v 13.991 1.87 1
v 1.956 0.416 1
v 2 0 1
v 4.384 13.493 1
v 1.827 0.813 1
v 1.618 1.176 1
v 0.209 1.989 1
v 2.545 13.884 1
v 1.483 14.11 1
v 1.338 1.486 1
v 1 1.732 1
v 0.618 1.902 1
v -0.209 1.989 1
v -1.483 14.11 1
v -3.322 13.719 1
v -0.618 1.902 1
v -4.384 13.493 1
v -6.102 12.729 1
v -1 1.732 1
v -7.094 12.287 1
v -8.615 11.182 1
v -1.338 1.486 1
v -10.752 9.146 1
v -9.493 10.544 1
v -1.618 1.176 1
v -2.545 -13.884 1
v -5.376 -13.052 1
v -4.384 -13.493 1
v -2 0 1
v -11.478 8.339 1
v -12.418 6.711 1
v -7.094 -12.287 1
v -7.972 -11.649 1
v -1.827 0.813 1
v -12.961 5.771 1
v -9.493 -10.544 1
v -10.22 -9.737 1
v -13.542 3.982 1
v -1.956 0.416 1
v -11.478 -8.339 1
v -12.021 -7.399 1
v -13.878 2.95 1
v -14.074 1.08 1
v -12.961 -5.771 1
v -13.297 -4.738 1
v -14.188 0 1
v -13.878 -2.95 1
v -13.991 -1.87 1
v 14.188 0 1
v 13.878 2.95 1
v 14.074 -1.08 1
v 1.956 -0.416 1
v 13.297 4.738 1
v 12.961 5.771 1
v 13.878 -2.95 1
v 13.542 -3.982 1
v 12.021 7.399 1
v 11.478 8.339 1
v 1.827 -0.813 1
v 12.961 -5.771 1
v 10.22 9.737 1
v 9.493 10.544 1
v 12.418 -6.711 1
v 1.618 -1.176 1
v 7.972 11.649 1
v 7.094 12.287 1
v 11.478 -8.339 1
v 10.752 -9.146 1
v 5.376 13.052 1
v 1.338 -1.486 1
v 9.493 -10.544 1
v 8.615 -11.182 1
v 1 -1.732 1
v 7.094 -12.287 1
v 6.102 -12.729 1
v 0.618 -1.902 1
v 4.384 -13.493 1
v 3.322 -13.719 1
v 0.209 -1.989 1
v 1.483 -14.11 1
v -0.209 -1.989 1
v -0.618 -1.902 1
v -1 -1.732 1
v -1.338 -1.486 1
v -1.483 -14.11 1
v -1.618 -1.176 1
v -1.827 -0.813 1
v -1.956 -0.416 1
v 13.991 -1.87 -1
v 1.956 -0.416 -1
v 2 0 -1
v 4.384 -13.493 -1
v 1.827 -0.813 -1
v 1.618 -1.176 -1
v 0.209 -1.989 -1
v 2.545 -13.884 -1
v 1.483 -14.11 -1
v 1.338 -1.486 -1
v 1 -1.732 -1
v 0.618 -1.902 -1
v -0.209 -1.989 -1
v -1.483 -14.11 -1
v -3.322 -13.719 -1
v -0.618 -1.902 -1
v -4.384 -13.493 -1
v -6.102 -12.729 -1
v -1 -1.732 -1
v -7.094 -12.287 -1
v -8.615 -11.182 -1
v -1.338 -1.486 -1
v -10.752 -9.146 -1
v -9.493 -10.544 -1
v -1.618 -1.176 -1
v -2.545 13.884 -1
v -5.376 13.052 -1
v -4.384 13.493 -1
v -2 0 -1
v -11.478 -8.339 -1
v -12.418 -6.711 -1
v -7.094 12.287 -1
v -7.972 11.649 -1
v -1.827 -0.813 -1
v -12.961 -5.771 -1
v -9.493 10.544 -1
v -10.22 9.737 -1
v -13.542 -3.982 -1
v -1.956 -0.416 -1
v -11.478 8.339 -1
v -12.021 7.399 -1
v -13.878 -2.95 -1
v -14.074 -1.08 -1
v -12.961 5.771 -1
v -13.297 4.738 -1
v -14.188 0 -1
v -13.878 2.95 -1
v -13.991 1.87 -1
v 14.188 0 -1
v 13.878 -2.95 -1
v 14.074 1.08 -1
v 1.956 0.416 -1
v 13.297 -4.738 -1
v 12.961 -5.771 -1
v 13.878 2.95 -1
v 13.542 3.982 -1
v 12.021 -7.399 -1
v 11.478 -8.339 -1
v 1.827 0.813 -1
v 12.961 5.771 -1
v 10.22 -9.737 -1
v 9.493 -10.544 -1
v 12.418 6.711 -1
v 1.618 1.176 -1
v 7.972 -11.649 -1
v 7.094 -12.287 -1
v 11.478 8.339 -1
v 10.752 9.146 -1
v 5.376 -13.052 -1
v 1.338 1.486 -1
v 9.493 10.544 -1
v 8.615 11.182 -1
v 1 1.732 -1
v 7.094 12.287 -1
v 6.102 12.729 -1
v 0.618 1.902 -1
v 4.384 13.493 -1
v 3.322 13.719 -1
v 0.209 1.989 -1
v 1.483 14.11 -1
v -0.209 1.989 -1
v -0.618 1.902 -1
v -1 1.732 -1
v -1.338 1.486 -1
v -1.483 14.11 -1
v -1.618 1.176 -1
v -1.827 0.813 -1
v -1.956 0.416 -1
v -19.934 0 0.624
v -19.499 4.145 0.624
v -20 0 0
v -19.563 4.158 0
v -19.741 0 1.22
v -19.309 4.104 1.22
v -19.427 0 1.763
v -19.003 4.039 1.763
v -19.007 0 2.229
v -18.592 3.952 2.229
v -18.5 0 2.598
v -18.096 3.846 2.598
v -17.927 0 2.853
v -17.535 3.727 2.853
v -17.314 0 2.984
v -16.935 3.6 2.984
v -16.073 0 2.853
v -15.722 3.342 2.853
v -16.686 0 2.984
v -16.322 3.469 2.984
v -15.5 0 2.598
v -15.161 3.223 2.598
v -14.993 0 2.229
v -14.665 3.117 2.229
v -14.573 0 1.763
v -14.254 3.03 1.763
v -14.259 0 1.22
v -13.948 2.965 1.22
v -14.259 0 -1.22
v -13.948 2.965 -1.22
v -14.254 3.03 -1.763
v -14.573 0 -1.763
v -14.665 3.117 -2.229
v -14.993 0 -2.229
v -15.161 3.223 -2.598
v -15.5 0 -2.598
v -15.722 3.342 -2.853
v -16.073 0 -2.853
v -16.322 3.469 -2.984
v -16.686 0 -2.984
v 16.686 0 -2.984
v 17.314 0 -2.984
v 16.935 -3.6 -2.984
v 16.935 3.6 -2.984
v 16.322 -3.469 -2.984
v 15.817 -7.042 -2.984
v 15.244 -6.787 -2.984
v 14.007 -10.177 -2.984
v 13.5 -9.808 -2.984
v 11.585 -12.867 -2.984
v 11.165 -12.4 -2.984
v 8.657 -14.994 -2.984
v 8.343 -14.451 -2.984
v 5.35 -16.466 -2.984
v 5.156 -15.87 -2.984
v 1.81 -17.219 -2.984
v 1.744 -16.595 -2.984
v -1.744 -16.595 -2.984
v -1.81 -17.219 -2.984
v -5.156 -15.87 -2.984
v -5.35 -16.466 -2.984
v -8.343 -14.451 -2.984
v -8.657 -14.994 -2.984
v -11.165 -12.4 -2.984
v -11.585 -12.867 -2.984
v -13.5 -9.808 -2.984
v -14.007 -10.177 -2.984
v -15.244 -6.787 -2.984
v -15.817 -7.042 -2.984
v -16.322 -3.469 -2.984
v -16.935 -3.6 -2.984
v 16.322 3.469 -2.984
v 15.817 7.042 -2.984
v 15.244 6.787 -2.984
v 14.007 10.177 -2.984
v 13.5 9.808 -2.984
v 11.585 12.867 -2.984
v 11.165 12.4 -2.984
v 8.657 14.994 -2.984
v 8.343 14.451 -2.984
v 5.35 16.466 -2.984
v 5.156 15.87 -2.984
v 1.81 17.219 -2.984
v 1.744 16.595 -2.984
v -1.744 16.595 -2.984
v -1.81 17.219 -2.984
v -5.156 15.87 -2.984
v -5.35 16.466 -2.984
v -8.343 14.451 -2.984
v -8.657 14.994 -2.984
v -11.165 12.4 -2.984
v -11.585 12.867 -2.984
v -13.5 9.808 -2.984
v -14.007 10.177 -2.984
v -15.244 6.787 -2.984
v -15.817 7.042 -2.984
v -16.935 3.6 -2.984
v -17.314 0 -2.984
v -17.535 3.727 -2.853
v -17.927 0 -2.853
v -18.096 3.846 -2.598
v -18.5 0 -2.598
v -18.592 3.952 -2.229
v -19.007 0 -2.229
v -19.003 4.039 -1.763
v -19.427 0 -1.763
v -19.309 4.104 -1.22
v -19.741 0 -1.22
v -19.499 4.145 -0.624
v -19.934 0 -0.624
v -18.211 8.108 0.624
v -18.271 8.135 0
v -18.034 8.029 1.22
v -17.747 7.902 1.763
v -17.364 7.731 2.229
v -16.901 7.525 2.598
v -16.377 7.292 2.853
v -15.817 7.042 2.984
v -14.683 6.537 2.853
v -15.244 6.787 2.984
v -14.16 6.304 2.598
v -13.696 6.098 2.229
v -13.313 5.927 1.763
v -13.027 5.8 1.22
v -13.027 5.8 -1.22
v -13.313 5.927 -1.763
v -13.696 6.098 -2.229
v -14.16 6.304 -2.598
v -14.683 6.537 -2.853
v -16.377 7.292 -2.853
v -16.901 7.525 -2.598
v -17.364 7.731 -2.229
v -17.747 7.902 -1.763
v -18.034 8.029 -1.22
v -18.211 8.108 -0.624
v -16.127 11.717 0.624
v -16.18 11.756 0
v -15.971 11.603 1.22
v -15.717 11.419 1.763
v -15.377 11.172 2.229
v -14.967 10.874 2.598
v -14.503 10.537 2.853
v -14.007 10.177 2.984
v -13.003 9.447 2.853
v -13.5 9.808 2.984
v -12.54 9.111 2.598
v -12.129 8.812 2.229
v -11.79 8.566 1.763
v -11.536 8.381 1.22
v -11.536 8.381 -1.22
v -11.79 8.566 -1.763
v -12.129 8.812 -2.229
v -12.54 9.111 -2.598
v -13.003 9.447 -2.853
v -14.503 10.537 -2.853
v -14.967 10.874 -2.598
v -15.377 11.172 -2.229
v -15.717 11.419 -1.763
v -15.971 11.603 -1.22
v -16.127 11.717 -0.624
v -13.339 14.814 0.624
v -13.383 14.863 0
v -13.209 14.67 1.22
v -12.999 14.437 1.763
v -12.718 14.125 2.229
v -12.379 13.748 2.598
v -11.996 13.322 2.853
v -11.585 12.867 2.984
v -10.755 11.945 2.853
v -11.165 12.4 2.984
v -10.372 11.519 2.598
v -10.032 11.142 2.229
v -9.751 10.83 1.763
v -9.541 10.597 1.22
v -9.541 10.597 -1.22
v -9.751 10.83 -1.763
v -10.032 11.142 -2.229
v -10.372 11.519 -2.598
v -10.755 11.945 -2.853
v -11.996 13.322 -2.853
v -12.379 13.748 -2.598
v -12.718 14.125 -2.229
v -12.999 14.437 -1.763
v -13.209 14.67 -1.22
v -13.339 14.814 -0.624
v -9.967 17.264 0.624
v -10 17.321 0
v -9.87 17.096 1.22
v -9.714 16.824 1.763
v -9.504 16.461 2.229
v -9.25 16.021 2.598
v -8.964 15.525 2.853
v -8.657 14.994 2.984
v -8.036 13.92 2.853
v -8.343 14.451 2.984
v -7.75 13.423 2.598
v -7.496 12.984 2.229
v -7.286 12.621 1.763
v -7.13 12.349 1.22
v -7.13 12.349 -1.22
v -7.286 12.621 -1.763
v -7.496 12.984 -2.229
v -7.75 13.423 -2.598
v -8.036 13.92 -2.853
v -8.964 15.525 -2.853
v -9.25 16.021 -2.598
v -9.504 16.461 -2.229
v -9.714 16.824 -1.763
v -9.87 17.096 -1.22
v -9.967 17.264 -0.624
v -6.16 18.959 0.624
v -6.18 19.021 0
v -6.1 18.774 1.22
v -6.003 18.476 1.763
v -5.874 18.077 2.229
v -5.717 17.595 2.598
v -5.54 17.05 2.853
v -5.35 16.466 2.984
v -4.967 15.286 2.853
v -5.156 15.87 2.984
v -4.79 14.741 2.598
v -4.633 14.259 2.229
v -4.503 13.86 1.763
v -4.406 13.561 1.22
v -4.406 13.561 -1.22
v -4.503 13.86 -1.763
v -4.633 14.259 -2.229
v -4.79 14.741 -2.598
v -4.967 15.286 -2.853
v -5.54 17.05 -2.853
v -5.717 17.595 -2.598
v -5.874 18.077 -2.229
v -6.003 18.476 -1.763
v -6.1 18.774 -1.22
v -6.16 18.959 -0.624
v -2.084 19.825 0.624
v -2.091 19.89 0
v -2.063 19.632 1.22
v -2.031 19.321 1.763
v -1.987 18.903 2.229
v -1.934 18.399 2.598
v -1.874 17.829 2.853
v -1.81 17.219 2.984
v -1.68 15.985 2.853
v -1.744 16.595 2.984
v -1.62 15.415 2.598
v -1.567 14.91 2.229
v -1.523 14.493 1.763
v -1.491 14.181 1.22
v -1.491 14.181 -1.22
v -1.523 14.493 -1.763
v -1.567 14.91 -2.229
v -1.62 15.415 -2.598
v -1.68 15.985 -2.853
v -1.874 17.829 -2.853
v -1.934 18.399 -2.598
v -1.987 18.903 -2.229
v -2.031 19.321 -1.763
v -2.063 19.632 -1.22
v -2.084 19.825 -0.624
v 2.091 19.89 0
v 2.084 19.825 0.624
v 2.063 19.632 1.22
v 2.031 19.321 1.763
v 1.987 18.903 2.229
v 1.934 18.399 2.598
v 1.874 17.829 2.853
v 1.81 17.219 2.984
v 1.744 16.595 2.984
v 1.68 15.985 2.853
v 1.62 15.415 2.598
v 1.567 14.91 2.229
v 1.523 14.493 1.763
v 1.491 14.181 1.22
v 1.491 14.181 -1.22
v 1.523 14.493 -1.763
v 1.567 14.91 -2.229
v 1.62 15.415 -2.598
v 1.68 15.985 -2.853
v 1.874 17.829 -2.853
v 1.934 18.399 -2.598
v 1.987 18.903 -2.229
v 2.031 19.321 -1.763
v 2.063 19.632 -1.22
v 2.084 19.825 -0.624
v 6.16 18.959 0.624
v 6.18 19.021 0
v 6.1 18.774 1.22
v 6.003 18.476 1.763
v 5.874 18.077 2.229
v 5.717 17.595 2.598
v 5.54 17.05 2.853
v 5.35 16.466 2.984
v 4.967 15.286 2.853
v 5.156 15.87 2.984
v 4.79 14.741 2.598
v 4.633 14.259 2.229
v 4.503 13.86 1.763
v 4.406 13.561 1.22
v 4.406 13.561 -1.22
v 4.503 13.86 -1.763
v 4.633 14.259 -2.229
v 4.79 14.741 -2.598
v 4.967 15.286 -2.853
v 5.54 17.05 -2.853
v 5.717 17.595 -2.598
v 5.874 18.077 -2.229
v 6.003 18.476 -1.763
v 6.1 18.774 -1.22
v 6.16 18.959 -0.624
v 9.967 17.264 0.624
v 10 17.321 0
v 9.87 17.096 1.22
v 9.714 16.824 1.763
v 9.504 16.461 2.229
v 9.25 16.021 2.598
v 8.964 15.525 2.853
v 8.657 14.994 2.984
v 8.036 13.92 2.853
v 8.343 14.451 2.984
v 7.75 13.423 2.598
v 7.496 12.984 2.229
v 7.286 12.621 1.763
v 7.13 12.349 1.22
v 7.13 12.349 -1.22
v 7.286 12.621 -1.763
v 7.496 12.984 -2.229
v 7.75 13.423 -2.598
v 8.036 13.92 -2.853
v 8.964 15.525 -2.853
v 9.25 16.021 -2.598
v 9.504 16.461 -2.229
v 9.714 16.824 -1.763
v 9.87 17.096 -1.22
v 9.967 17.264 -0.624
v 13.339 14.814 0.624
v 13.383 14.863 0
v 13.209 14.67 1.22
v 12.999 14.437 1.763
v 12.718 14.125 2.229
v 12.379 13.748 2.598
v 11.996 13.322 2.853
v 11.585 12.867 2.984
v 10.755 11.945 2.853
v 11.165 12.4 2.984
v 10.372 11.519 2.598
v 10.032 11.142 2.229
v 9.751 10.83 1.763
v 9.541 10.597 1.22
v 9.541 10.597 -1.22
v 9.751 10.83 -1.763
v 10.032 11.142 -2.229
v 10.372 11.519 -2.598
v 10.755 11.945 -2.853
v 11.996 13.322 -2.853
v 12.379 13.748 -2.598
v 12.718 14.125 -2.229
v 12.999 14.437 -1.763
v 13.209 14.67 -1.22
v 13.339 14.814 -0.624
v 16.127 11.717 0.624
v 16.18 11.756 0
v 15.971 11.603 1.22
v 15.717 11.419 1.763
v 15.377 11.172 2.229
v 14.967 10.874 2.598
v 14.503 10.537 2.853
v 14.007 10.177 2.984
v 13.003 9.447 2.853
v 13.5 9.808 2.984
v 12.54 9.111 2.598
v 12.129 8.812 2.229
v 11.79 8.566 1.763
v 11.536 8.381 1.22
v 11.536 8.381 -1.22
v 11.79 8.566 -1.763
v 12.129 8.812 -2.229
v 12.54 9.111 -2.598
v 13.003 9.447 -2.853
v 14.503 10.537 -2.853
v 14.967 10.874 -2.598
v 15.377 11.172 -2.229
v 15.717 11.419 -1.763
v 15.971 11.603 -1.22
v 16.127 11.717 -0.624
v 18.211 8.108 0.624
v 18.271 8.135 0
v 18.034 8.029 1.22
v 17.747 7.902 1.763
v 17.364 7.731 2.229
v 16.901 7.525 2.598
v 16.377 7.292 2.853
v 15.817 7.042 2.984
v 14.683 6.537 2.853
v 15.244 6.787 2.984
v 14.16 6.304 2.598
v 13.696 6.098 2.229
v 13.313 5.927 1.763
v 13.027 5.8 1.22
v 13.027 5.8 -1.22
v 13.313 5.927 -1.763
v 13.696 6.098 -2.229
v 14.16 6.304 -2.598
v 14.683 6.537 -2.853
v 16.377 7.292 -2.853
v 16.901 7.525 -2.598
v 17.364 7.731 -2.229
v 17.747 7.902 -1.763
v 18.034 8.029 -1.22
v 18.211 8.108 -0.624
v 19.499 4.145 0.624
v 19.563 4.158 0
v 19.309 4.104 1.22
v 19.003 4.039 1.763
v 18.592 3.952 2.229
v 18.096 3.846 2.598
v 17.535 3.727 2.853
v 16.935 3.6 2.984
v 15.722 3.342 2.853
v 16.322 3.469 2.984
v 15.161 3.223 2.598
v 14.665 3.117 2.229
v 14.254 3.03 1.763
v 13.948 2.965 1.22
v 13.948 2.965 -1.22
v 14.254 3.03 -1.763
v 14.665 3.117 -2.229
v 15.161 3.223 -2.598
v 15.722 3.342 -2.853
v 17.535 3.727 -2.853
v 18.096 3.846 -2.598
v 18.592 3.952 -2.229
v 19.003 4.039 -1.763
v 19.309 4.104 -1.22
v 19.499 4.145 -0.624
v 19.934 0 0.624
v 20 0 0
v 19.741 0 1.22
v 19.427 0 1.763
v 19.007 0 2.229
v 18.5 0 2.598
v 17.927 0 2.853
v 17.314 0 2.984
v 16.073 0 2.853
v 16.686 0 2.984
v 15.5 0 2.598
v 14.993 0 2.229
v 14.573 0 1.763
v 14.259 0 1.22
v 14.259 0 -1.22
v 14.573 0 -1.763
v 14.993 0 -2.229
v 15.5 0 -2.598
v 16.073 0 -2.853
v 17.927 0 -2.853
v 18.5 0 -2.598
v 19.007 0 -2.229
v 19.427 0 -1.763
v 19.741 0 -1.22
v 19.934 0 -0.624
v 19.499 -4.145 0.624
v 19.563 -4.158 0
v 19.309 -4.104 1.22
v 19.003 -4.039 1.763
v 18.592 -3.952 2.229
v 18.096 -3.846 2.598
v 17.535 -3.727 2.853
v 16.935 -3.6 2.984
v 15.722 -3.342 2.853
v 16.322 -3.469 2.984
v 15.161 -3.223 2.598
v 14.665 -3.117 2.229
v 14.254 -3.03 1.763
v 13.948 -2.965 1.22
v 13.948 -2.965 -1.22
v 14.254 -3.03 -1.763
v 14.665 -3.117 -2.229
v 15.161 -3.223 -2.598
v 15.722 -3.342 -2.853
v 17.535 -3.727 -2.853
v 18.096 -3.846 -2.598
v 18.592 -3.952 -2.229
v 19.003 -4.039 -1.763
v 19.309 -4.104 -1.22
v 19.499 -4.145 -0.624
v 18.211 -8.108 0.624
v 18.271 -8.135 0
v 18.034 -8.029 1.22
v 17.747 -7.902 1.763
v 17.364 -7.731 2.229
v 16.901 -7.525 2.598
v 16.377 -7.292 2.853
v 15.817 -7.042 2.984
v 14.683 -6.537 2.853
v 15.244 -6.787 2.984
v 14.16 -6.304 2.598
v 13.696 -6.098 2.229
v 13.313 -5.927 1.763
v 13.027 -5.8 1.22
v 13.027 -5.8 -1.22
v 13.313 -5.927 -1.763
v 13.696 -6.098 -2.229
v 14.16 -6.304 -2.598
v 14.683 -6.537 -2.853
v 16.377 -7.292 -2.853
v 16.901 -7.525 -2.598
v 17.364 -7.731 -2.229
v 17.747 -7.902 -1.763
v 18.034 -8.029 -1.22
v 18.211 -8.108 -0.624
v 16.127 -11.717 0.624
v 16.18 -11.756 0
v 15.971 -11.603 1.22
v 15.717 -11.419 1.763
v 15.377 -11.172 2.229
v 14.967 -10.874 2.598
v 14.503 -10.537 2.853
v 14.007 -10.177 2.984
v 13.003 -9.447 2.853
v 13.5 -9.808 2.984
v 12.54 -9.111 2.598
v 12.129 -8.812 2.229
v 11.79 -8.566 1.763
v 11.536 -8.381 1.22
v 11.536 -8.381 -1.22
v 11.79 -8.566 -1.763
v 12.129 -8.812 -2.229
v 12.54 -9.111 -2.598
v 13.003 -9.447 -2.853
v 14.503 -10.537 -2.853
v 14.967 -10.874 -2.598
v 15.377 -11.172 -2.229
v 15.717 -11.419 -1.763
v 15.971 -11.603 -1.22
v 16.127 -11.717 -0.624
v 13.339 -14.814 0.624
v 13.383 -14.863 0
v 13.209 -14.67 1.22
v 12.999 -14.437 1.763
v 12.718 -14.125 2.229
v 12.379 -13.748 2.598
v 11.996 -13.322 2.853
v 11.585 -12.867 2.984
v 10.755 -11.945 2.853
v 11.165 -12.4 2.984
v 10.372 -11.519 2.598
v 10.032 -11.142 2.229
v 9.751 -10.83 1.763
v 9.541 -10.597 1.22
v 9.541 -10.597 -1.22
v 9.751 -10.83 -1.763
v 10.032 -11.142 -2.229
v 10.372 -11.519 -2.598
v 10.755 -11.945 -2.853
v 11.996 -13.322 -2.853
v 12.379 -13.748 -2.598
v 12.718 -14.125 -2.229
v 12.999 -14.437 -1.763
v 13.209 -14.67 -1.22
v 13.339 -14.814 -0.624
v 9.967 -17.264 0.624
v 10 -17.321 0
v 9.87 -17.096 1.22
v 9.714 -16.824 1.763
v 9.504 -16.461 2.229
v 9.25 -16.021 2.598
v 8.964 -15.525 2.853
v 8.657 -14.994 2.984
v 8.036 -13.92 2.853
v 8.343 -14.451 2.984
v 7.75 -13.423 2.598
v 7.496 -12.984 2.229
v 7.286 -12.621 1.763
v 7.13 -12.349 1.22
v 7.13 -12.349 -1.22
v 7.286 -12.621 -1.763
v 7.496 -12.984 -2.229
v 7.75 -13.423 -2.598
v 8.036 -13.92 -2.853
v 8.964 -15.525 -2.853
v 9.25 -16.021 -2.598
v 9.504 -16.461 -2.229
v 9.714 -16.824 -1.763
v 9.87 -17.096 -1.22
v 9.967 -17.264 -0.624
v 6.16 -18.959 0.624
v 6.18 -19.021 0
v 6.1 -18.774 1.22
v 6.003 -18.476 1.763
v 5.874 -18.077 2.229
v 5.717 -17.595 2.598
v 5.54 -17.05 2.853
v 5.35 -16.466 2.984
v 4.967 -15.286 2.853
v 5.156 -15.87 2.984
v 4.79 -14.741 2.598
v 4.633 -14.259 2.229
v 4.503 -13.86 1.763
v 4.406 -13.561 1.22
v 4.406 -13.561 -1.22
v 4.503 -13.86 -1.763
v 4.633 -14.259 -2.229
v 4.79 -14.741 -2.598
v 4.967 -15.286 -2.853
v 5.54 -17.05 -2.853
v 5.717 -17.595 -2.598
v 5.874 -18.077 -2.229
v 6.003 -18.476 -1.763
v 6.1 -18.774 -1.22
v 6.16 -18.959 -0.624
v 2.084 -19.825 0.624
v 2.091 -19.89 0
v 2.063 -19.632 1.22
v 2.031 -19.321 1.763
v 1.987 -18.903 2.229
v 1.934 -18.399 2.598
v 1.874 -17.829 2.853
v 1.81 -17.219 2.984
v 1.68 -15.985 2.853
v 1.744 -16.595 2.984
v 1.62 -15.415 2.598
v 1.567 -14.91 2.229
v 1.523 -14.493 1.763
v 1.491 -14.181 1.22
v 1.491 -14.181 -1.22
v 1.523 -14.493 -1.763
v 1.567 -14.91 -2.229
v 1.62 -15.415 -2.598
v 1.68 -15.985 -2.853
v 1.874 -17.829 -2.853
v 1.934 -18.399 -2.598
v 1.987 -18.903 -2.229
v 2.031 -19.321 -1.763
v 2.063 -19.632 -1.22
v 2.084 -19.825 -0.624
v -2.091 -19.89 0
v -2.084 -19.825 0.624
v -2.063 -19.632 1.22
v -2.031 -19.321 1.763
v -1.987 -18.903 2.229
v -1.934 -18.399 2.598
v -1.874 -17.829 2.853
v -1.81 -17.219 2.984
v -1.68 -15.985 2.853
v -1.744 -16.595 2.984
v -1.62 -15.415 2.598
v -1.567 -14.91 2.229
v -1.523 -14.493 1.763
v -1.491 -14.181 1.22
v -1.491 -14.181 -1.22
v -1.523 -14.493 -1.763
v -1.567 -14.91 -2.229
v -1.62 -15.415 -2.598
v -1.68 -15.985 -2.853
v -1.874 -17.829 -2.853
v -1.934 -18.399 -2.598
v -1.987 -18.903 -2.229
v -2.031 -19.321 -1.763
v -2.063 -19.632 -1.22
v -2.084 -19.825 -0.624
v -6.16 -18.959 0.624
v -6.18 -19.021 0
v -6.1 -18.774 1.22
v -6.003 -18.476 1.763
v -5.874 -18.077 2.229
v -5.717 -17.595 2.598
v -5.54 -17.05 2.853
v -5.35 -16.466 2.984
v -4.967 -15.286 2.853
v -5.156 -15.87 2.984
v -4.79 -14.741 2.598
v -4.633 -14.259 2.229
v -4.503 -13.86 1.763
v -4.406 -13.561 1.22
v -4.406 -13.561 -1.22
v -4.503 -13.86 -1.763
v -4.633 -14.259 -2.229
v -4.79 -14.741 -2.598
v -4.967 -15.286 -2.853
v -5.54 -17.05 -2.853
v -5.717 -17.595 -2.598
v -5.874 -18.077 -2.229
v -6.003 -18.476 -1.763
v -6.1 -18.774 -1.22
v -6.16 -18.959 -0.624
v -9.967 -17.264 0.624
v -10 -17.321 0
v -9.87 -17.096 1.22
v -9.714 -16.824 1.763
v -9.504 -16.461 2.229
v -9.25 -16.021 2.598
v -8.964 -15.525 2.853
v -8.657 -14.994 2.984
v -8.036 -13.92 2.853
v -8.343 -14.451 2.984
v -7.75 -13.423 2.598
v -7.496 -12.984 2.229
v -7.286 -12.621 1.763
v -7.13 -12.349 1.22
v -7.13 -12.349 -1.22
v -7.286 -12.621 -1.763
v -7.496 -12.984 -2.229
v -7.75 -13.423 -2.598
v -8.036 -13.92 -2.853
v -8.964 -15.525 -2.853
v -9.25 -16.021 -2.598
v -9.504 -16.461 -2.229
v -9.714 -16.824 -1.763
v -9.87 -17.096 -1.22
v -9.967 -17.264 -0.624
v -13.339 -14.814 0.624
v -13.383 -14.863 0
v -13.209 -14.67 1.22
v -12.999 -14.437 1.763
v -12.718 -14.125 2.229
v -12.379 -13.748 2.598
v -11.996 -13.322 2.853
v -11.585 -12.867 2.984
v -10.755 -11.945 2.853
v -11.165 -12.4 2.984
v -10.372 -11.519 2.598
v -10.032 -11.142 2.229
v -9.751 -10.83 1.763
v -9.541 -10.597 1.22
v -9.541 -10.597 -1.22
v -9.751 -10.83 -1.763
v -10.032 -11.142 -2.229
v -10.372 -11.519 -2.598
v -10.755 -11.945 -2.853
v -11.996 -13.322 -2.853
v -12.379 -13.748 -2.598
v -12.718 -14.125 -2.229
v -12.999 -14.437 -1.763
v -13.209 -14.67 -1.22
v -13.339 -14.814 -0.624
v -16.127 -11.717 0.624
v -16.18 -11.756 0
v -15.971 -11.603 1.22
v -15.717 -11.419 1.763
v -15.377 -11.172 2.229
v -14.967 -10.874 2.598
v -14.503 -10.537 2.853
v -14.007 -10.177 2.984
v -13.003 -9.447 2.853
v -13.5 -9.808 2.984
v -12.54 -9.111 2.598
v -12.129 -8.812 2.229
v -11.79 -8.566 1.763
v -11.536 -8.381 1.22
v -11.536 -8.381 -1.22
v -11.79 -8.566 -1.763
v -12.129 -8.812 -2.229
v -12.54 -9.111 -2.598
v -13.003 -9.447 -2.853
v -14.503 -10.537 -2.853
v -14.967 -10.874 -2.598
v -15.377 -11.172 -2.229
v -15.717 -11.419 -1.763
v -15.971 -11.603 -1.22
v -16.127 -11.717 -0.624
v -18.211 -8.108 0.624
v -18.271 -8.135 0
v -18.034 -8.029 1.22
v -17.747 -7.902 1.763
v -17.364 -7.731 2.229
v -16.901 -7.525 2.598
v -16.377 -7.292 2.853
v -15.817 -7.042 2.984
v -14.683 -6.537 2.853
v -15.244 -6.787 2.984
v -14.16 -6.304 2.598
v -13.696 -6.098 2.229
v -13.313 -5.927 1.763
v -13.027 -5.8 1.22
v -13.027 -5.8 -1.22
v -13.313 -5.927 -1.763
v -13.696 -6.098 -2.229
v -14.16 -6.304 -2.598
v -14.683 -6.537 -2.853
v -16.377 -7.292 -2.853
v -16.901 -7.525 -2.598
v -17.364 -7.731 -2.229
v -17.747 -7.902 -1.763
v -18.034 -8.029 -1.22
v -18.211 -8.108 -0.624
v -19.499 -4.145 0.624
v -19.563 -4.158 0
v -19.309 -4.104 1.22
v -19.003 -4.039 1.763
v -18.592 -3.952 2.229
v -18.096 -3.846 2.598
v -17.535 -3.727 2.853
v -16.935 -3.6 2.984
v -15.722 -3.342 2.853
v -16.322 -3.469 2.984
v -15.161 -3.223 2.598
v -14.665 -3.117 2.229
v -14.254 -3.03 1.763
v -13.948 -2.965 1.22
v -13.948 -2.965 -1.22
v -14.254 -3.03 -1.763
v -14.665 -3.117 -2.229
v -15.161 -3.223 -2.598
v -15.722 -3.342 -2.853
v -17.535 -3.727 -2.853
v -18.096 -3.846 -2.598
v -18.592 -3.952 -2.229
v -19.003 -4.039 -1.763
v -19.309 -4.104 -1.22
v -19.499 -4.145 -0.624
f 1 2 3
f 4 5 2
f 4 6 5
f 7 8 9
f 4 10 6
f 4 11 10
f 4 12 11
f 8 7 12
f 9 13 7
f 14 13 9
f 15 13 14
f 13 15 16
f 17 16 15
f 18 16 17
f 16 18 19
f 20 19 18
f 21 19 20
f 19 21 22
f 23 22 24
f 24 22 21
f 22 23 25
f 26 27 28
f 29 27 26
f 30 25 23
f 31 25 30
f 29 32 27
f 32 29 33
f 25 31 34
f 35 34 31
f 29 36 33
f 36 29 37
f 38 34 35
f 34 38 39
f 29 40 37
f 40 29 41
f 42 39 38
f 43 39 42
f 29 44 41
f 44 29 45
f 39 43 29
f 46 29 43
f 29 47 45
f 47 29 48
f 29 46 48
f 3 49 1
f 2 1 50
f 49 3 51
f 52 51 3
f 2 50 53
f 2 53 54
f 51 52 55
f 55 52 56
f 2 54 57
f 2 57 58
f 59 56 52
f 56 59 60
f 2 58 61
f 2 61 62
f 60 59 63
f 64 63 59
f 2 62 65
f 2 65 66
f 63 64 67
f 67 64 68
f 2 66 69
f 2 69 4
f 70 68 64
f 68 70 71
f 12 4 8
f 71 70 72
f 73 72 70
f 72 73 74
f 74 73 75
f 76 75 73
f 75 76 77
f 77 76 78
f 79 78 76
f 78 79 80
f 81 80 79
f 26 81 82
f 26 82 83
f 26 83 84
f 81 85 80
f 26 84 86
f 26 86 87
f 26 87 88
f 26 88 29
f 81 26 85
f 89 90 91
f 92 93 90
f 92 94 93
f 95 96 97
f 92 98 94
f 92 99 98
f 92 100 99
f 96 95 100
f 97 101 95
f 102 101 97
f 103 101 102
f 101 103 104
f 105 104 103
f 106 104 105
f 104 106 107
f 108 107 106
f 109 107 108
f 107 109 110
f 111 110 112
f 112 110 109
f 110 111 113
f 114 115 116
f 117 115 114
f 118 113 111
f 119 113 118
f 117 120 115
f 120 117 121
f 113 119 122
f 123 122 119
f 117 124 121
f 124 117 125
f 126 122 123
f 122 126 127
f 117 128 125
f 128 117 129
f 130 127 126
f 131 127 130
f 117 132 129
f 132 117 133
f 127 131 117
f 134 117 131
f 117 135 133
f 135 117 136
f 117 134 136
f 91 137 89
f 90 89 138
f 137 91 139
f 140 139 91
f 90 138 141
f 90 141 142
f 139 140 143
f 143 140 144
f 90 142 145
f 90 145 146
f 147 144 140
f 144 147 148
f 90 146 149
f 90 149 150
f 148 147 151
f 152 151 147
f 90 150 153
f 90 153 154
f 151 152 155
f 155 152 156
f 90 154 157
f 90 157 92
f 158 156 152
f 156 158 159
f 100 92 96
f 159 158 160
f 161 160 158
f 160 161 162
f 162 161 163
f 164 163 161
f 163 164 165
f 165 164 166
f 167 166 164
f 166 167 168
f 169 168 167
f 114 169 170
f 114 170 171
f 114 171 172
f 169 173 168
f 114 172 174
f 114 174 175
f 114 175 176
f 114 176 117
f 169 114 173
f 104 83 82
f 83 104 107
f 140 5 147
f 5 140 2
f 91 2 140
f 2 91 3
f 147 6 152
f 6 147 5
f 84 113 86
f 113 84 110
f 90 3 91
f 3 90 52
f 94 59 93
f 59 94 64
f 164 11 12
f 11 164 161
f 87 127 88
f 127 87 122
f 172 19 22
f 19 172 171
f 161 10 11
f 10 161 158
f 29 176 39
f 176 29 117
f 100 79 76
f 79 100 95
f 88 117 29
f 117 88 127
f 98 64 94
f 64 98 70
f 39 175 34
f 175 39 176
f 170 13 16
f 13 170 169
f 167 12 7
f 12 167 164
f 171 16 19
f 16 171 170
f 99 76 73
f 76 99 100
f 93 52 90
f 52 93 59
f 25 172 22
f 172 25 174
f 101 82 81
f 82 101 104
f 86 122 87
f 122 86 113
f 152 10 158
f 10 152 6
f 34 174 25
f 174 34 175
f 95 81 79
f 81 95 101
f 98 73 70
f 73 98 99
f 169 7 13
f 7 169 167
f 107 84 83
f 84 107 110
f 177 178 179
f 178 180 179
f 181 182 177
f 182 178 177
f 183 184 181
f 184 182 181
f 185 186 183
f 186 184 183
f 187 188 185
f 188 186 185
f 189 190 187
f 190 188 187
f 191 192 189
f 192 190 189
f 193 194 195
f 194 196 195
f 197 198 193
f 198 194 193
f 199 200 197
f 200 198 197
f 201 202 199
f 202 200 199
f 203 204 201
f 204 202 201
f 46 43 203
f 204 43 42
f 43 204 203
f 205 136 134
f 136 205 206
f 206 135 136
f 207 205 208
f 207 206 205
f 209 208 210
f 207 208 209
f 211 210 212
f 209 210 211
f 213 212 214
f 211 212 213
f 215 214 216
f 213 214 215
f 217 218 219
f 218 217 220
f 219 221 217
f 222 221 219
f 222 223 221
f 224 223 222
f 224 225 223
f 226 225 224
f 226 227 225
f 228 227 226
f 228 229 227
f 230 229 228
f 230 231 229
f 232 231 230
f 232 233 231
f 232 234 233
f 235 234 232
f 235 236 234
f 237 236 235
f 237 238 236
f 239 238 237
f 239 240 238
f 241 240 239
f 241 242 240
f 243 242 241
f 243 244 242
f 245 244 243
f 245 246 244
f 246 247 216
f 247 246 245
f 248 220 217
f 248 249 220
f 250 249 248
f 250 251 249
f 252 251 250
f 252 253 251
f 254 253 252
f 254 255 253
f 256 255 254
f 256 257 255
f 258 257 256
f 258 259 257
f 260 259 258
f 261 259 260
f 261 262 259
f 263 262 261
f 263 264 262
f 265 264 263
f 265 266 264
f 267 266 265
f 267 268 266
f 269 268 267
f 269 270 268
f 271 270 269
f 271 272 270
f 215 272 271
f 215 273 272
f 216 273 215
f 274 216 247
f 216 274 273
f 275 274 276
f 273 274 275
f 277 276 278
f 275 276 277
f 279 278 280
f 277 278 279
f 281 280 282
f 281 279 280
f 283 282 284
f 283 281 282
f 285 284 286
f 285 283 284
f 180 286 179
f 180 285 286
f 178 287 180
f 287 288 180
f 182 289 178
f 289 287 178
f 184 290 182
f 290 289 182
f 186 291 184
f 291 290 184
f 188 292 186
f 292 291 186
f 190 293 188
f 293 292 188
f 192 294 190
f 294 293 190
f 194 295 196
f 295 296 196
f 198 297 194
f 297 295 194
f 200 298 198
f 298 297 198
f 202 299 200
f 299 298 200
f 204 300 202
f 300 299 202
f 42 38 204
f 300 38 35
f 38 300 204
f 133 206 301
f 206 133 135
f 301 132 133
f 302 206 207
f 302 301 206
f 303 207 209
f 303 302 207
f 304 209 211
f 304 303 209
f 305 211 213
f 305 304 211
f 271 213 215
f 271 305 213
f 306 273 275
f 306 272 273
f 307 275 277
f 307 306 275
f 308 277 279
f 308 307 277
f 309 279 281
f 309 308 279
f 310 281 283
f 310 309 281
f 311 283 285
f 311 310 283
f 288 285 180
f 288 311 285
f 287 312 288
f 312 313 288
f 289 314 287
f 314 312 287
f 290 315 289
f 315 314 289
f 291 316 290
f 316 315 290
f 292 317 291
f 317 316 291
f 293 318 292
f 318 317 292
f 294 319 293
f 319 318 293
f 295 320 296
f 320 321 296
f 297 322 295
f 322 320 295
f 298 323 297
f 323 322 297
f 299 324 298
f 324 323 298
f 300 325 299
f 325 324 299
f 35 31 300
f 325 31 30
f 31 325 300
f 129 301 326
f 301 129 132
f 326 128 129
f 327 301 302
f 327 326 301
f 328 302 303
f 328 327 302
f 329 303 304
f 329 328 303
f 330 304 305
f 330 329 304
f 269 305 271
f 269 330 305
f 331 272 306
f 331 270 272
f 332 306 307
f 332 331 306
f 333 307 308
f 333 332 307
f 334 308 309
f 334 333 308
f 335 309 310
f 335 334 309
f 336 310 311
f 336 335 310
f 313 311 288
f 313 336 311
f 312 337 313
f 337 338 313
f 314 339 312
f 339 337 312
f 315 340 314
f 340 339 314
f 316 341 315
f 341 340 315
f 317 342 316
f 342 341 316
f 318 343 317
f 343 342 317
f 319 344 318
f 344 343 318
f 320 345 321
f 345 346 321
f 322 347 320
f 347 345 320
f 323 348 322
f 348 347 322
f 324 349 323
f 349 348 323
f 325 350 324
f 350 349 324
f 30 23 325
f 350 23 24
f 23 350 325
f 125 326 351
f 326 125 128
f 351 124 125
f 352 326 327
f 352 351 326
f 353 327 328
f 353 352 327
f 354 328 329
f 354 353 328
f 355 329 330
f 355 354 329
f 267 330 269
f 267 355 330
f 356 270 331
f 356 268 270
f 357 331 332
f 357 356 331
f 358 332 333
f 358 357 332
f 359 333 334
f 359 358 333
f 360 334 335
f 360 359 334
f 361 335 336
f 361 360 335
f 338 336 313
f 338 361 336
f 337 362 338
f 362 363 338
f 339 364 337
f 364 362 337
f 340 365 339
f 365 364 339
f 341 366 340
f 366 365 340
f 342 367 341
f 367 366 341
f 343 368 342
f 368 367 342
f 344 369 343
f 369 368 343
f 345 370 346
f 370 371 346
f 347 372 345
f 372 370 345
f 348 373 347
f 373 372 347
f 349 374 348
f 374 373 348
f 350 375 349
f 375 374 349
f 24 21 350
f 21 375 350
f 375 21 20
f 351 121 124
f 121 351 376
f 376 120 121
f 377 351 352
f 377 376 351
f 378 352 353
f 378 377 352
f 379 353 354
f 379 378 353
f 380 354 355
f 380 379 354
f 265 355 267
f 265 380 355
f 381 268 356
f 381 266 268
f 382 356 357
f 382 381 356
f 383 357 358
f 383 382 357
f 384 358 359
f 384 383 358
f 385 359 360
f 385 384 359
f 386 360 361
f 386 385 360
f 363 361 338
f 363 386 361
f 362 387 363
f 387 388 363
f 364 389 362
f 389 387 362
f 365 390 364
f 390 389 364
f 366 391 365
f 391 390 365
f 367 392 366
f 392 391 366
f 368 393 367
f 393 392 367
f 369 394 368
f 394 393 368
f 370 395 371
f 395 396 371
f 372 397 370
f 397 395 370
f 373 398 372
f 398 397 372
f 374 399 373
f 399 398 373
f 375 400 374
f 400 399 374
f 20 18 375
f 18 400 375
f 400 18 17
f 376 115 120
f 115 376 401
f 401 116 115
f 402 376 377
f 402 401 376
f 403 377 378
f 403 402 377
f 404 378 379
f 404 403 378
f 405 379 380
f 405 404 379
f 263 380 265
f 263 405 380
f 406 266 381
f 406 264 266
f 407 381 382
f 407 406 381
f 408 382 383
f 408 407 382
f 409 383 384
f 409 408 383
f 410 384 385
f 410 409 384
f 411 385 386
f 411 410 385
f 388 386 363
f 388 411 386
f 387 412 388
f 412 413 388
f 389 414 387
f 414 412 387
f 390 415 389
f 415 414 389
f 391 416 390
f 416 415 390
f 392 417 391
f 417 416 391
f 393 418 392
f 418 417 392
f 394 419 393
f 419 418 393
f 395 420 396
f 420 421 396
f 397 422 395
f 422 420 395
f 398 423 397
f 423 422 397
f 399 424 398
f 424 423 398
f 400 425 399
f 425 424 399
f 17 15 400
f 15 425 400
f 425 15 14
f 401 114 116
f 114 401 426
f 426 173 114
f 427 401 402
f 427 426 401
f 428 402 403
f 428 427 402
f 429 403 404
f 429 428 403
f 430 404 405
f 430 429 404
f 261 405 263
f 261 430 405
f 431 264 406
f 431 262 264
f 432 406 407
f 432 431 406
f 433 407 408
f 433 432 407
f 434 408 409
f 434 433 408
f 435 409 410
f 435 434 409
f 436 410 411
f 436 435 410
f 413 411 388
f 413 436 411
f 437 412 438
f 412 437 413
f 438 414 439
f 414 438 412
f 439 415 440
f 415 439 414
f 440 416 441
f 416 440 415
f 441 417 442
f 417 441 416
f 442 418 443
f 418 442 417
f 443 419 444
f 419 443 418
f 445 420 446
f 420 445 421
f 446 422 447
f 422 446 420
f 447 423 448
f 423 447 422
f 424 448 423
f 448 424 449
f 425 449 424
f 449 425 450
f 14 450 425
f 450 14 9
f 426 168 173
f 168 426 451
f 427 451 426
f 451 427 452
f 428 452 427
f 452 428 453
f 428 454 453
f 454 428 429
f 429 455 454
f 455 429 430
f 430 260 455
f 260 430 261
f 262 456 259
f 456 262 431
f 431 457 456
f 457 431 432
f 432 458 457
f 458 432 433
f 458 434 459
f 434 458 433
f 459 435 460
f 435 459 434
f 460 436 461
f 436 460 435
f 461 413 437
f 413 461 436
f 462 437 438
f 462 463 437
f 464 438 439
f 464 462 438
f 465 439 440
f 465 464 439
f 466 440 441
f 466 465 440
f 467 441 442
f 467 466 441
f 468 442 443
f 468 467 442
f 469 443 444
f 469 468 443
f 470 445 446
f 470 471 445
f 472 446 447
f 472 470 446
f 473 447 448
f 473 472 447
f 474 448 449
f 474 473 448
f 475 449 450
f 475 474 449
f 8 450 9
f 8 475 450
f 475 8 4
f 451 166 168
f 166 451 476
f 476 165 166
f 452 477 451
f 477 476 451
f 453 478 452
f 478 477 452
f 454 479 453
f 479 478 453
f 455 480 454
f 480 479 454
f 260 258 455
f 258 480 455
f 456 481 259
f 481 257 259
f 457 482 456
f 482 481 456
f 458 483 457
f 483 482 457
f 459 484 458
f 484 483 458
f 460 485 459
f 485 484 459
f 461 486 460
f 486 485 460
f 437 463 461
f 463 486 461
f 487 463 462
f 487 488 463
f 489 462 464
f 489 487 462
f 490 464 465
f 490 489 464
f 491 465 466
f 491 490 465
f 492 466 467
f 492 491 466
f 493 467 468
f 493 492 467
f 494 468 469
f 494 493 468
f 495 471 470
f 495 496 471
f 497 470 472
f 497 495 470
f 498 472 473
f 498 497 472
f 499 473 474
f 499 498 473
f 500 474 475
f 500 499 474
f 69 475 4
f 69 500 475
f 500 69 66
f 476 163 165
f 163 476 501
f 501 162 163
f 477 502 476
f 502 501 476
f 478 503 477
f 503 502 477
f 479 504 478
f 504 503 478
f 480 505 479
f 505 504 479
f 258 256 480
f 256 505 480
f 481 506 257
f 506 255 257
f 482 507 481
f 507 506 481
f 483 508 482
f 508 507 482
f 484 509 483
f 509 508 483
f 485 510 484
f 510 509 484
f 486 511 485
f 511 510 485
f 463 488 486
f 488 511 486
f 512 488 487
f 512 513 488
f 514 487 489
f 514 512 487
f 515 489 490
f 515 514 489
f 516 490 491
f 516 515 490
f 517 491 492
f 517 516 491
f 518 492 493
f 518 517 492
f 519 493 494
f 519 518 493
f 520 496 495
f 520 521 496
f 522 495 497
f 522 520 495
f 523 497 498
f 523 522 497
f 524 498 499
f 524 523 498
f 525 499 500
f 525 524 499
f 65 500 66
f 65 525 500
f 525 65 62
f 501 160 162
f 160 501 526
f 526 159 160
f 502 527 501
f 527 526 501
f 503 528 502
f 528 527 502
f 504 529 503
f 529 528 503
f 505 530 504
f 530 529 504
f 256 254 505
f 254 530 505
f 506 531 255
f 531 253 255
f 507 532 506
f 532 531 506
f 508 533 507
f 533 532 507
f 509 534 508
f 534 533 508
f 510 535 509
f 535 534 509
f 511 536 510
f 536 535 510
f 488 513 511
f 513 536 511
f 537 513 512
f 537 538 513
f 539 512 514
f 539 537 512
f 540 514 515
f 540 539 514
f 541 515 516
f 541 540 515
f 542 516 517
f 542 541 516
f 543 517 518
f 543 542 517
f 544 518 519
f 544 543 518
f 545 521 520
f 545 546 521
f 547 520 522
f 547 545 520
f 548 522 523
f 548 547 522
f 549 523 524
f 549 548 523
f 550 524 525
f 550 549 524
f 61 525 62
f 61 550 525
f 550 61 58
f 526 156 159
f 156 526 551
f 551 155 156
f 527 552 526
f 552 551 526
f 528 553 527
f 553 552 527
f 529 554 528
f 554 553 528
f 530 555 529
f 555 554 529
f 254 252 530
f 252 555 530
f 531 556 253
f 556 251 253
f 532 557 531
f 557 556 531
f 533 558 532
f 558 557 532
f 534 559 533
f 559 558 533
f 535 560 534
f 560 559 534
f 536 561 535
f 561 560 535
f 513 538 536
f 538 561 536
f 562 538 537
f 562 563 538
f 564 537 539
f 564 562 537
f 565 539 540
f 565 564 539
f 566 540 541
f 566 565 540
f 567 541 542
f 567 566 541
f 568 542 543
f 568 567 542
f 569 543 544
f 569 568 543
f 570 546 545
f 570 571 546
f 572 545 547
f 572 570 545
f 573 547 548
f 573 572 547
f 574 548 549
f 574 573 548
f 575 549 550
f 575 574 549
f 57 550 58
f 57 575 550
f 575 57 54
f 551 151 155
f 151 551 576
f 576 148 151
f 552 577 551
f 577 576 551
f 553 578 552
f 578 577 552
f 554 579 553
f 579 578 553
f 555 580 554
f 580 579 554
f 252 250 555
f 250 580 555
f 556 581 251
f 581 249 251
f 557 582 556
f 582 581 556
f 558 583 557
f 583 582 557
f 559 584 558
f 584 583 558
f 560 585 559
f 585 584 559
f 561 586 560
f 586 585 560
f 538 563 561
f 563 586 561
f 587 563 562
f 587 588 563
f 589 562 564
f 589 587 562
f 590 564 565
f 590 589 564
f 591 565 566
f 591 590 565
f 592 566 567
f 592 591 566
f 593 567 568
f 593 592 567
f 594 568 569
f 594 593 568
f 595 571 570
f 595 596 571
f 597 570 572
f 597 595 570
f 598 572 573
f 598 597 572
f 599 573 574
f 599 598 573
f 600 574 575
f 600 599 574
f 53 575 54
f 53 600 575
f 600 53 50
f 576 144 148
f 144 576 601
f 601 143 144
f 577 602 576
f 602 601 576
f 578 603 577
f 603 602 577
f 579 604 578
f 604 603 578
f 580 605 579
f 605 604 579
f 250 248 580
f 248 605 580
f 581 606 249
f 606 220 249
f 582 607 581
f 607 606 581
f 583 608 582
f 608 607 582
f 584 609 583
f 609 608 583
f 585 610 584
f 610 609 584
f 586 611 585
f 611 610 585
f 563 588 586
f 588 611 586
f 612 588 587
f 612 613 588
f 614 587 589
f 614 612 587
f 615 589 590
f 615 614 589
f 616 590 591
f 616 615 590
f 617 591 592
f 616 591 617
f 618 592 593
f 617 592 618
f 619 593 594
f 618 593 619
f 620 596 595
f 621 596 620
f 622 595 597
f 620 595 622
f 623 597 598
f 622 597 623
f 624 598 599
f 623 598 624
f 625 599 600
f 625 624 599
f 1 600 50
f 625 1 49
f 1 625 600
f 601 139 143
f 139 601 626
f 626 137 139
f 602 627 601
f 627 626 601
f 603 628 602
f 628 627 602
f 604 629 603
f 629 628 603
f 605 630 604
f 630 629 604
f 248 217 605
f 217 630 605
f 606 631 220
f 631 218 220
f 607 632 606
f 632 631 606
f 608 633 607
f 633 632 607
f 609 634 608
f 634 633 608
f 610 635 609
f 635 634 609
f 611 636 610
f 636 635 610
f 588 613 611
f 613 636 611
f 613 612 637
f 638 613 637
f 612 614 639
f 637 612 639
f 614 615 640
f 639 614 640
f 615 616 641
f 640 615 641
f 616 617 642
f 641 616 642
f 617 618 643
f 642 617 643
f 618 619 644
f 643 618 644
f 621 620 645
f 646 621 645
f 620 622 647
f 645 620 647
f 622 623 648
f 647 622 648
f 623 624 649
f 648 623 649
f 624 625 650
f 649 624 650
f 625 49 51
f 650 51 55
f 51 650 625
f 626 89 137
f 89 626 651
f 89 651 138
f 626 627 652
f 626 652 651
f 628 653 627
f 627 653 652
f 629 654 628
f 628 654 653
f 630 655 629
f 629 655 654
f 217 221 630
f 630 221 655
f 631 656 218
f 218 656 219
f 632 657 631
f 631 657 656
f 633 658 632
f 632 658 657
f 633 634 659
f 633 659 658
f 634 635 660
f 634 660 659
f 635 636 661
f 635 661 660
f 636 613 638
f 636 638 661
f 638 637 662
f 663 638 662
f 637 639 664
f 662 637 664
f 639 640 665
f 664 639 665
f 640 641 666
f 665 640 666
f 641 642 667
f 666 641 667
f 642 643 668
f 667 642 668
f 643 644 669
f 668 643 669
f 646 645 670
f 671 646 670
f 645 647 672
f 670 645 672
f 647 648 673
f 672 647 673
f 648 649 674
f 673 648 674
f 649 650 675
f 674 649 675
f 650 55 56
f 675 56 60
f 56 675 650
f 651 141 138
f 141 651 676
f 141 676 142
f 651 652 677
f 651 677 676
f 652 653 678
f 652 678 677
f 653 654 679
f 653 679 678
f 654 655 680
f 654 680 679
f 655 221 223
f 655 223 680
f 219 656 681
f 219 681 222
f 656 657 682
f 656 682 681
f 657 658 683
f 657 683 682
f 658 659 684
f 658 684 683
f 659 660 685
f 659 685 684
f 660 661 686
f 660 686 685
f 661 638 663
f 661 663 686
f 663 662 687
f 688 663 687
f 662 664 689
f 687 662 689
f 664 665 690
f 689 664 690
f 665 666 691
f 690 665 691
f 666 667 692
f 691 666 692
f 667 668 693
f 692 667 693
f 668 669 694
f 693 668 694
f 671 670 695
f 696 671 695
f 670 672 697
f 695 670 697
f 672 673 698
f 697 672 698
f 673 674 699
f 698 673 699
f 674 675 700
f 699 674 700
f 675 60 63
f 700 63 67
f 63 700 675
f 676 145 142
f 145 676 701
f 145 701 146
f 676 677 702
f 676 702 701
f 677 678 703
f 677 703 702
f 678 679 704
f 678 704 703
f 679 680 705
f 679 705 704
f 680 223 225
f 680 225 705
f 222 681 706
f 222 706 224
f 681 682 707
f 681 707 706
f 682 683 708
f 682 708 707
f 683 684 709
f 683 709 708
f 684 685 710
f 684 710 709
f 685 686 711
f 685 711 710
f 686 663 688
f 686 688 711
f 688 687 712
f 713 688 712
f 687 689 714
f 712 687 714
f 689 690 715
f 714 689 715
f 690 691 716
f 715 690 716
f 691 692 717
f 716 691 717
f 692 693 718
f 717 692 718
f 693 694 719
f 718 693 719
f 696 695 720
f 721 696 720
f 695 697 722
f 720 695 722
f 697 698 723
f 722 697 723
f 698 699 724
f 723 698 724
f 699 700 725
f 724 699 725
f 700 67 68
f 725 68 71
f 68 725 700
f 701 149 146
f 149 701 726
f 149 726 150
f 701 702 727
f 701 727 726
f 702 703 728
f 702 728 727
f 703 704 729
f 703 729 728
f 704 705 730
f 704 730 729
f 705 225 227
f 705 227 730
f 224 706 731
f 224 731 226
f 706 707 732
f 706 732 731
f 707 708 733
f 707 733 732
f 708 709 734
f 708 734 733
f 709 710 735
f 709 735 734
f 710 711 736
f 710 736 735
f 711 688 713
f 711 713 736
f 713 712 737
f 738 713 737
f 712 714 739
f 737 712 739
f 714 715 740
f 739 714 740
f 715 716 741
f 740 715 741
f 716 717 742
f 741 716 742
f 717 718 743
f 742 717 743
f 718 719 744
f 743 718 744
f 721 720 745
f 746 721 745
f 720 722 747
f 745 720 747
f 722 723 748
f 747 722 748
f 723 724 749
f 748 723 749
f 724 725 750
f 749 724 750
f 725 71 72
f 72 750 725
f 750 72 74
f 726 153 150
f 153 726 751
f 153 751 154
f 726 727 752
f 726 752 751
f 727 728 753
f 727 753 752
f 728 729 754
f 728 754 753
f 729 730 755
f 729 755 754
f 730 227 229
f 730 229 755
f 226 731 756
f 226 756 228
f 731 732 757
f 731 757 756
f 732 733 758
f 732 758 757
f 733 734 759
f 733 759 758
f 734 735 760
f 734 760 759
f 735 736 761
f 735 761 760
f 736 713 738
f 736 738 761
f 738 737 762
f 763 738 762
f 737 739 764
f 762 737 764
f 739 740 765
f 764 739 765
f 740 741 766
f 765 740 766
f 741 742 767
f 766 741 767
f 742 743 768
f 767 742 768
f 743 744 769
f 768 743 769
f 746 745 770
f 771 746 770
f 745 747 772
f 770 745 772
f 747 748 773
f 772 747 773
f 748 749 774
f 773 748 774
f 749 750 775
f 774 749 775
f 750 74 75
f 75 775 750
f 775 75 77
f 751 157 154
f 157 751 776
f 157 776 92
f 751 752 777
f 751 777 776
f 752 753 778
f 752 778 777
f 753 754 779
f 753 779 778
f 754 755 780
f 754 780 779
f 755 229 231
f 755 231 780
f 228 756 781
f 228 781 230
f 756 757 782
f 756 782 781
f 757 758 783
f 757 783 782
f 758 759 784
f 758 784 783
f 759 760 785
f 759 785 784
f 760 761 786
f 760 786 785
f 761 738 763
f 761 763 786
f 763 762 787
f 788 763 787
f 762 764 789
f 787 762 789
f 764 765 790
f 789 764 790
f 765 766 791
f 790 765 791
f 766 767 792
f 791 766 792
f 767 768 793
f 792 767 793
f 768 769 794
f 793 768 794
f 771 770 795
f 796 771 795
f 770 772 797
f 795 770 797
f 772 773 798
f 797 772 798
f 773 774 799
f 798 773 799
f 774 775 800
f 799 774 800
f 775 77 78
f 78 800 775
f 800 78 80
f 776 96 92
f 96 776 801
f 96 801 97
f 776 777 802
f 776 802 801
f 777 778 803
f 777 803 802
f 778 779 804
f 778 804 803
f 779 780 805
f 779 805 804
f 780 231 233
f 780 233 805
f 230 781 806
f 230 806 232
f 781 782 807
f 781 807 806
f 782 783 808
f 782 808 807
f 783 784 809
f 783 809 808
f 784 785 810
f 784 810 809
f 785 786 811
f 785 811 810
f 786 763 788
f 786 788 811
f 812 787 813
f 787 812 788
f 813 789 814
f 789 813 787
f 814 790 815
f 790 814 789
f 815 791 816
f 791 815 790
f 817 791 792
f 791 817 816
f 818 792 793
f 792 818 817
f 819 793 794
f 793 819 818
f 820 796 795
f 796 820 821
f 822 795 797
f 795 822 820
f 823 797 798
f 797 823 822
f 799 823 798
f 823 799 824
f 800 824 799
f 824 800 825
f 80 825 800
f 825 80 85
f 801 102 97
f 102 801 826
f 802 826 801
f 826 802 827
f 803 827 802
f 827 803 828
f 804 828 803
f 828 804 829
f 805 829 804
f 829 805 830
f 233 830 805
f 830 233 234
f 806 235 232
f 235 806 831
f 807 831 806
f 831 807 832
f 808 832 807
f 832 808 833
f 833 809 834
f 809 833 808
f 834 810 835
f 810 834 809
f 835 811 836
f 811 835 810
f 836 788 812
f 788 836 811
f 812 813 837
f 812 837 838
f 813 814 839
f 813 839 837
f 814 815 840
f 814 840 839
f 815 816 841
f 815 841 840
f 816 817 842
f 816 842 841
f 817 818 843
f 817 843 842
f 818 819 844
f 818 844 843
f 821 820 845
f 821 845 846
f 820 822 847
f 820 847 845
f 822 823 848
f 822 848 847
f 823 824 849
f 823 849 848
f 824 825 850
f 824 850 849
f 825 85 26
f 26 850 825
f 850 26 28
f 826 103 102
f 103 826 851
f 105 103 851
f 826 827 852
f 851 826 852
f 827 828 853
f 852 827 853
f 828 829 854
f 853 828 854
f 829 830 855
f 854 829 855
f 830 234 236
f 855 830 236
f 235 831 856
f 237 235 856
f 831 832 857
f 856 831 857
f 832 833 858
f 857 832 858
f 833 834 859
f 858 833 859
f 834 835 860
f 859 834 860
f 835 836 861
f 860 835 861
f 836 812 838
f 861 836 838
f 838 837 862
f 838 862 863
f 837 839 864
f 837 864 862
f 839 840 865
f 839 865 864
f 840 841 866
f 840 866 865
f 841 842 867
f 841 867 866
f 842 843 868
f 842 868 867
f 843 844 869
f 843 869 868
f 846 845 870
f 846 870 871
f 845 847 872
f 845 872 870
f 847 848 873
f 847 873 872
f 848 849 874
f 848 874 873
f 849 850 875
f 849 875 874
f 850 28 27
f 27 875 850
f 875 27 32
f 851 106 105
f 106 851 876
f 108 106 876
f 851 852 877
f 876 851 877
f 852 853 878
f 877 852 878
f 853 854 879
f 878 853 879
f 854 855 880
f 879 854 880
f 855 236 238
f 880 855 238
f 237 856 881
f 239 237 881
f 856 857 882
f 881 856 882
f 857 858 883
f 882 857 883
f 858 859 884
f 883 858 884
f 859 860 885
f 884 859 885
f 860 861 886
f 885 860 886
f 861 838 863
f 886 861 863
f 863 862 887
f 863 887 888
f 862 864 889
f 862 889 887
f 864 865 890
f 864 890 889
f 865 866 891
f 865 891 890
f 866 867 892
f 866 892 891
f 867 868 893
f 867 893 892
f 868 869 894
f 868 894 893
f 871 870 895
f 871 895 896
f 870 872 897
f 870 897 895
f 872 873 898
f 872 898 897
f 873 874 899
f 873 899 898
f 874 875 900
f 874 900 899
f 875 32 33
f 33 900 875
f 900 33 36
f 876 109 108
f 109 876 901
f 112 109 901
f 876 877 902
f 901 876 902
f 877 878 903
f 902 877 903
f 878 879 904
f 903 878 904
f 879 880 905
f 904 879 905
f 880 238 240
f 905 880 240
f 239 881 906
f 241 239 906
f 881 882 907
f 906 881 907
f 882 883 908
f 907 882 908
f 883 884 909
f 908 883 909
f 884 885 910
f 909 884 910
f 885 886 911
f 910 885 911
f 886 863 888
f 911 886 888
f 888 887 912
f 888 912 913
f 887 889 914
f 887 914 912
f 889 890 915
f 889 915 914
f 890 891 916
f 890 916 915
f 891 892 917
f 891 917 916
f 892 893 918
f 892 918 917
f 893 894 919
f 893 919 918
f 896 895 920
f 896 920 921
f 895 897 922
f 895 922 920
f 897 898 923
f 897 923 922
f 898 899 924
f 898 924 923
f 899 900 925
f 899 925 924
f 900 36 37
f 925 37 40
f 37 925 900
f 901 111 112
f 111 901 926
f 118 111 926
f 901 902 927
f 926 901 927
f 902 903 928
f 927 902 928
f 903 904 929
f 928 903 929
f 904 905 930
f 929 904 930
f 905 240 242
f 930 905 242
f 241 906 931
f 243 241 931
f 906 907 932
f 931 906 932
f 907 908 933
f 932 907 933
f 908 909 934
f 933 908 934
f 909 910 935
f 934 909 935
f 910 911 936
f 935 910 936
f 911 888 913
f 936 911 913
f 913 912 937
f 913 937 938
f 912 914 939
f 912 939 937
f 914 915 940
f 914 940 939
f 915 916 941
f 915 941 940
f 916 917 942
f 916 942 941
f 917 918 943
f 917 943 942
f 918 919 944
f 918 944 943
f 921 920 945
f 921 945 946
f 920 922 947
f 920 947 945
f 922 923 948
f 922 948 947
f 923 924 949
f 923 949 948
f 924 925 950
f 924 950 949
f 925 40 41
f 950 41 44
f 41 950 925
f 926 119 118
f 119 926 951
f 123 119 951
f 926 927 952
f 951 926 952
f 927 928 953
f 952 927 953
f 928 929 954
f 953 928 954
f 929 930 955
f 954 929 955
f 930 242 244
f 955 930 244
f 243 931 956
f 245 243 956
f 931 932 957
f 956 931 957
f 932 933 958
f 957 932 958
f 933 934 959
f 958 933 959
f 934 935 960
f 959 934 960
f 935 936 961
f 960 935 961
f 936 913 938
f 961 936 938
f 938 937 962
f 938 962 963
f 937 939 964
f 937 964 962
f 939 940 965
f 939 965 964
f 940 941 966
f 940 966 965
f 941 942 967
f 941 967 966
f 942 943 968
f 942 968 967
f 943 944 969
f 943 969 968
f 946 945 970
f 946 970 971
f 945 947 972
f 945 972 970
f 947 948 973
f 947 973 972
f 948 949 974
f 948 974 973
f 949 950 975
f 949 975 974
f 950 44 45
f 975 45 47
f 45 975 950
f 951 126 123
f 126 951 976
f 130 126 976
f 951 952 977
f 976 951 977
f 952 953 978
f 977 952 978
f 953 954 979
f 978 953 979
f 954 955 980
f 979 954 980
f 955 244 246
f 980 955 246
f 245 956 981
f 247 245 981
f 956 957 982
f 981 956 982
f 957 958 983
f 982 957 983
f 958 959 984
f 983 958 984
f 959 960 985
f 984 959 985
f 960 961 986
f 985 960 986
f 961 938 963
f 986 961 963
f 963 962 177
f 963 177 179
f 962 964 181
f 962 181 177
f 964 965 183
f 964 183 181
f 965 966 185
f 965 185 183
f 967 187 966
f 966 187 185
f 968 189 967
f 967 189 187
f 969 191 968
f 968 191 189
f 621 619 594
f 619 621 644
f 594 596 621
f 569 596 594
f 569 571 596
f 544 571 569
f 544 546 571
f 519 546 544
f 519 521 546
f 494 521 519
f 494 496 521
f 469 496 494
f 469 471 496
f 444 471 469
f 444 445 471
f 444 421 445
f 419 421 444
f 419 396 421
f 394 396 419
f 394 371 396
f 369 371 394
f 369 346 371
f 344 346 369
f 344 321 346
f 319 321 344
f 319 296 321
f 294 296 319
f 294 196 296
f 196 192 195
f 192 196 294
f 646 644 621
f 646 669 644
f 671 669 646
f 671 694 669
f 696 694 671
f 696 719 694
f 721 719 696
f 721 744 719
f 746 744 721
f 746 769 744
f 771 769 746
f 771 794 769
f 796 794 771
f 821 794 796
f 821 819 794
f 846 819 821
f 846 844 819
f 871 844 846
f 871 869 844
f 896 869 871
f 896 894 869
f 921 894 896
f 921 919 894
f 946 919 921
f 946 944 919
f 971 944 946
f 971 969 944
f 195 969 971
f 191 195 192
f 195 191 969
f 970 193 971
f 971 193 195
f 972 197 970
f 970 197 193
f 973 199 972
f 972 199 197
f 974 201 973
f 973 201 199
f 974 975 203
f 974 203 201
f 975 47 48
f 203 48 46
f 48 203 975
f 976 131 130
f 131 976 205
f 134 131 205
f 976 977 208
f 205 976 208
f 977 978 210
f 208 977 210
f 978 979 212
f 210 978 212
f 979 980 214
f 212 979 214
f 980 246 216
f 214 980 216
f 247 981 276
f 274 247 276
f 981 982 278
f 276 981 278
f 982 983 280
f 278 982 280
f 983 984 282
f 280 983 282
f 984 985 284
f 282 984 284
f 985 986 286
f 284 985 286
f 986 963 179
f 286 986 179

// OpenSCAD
$fs=0.4;

module donut(wheel_radius=12){
tyre_diameter=6;

rotate_extrude(angle=360){
translate([wheel_radius-tyre_diameter/2,0])
circle(d=tyre_diameter);
}
}

module cylinder_wheel(wheel_radius=12){
difference(){
    cylinder(h=2,r=wheel_radius-2,center=true);
    cylinder(h=4,r=2,center=true);
}

donut(wheel_radius=wheel_radius);
}

//rotate([0,90,0])
cylinder_wheel(20);
